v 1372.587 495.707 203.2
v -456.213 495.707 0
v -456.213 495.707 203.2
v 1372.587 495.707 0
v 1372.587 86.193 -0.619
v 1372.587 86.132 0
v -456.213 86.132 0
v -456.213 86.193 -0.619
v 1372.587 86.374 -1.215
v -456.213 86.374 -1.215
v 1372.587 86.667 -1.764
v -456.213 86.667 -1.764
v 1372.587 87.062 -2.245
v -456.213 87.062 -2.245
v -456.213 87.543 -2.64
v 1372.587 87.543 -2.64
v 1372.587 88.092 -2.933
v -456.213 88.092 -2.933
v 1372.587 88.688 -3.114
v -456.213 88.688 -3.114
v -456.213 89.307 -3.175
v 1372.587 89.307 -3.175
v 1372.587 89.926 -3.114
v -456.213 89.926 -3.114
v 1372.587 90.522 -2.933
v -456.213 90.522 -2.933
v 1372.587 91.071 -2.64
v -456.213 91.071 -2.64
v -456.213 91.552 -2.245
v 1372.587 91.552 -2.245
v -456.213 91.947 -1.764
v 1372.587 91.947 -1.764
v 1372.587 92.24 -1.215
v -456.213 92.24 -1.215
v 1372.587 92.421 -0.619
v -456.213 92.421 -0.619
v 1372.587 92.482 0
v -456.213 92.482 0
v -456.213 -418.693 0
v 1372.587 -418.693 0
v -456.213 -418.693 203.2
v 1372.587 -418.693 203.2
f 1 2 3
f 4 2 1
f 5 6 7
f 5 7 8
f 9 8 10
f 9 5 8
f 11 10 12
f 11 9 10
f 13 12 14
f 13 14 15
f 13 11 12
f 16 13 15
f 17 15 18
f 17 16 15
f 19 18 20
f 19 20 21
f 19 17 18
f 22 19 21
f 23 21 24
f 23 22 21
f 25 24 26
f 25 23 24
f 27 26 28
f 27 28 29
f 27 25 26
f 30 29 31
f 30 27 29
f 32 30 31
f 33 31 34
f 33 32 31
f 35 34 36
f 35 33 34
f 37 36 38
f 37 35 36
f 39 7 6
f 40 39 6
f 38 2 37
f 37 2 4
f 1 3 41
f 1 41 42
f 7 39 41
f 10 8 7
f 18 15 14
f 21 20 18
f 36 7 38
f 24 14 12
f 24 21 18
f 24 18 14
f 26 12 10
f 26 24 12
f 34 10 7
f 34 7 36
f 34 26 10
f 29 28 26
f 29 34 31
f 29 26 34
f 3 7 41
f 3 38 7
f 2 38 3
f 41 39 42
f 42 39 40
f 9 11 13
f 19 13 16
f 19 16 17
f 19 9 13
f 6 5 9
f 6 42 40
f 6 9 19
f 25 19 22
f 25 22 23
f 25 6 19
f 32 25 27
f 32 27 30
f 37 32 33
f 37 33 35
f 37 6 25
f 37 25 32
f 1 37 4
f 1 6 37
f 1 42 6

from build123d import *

# Parameters (mm, degrees)
F0_W     = 1828.8
F0_H     = 914.4
F1_DEPTH = 203.2
F3_R     = 3.175
F4_DEPTH = 1828.8


with BuildPart() as f1:
    # F0 (on Top) → F1 (new body)
    with BuildSketch(Plane.XY):
        with Locations((458.187128, 38.50697)):
            Rectangle(F0_W, F0_H)
    extrude(amount=F1_DEPTH)

    # F3 (on face) → F4 (join)
    with BuildSketch(Plane.YZ.offset(1372.587128)):
        with Locations((89.30697, 0)):
            Circle(F3_R)
    extrude(amount=-F4_DEPTH)


solid = f1.part
